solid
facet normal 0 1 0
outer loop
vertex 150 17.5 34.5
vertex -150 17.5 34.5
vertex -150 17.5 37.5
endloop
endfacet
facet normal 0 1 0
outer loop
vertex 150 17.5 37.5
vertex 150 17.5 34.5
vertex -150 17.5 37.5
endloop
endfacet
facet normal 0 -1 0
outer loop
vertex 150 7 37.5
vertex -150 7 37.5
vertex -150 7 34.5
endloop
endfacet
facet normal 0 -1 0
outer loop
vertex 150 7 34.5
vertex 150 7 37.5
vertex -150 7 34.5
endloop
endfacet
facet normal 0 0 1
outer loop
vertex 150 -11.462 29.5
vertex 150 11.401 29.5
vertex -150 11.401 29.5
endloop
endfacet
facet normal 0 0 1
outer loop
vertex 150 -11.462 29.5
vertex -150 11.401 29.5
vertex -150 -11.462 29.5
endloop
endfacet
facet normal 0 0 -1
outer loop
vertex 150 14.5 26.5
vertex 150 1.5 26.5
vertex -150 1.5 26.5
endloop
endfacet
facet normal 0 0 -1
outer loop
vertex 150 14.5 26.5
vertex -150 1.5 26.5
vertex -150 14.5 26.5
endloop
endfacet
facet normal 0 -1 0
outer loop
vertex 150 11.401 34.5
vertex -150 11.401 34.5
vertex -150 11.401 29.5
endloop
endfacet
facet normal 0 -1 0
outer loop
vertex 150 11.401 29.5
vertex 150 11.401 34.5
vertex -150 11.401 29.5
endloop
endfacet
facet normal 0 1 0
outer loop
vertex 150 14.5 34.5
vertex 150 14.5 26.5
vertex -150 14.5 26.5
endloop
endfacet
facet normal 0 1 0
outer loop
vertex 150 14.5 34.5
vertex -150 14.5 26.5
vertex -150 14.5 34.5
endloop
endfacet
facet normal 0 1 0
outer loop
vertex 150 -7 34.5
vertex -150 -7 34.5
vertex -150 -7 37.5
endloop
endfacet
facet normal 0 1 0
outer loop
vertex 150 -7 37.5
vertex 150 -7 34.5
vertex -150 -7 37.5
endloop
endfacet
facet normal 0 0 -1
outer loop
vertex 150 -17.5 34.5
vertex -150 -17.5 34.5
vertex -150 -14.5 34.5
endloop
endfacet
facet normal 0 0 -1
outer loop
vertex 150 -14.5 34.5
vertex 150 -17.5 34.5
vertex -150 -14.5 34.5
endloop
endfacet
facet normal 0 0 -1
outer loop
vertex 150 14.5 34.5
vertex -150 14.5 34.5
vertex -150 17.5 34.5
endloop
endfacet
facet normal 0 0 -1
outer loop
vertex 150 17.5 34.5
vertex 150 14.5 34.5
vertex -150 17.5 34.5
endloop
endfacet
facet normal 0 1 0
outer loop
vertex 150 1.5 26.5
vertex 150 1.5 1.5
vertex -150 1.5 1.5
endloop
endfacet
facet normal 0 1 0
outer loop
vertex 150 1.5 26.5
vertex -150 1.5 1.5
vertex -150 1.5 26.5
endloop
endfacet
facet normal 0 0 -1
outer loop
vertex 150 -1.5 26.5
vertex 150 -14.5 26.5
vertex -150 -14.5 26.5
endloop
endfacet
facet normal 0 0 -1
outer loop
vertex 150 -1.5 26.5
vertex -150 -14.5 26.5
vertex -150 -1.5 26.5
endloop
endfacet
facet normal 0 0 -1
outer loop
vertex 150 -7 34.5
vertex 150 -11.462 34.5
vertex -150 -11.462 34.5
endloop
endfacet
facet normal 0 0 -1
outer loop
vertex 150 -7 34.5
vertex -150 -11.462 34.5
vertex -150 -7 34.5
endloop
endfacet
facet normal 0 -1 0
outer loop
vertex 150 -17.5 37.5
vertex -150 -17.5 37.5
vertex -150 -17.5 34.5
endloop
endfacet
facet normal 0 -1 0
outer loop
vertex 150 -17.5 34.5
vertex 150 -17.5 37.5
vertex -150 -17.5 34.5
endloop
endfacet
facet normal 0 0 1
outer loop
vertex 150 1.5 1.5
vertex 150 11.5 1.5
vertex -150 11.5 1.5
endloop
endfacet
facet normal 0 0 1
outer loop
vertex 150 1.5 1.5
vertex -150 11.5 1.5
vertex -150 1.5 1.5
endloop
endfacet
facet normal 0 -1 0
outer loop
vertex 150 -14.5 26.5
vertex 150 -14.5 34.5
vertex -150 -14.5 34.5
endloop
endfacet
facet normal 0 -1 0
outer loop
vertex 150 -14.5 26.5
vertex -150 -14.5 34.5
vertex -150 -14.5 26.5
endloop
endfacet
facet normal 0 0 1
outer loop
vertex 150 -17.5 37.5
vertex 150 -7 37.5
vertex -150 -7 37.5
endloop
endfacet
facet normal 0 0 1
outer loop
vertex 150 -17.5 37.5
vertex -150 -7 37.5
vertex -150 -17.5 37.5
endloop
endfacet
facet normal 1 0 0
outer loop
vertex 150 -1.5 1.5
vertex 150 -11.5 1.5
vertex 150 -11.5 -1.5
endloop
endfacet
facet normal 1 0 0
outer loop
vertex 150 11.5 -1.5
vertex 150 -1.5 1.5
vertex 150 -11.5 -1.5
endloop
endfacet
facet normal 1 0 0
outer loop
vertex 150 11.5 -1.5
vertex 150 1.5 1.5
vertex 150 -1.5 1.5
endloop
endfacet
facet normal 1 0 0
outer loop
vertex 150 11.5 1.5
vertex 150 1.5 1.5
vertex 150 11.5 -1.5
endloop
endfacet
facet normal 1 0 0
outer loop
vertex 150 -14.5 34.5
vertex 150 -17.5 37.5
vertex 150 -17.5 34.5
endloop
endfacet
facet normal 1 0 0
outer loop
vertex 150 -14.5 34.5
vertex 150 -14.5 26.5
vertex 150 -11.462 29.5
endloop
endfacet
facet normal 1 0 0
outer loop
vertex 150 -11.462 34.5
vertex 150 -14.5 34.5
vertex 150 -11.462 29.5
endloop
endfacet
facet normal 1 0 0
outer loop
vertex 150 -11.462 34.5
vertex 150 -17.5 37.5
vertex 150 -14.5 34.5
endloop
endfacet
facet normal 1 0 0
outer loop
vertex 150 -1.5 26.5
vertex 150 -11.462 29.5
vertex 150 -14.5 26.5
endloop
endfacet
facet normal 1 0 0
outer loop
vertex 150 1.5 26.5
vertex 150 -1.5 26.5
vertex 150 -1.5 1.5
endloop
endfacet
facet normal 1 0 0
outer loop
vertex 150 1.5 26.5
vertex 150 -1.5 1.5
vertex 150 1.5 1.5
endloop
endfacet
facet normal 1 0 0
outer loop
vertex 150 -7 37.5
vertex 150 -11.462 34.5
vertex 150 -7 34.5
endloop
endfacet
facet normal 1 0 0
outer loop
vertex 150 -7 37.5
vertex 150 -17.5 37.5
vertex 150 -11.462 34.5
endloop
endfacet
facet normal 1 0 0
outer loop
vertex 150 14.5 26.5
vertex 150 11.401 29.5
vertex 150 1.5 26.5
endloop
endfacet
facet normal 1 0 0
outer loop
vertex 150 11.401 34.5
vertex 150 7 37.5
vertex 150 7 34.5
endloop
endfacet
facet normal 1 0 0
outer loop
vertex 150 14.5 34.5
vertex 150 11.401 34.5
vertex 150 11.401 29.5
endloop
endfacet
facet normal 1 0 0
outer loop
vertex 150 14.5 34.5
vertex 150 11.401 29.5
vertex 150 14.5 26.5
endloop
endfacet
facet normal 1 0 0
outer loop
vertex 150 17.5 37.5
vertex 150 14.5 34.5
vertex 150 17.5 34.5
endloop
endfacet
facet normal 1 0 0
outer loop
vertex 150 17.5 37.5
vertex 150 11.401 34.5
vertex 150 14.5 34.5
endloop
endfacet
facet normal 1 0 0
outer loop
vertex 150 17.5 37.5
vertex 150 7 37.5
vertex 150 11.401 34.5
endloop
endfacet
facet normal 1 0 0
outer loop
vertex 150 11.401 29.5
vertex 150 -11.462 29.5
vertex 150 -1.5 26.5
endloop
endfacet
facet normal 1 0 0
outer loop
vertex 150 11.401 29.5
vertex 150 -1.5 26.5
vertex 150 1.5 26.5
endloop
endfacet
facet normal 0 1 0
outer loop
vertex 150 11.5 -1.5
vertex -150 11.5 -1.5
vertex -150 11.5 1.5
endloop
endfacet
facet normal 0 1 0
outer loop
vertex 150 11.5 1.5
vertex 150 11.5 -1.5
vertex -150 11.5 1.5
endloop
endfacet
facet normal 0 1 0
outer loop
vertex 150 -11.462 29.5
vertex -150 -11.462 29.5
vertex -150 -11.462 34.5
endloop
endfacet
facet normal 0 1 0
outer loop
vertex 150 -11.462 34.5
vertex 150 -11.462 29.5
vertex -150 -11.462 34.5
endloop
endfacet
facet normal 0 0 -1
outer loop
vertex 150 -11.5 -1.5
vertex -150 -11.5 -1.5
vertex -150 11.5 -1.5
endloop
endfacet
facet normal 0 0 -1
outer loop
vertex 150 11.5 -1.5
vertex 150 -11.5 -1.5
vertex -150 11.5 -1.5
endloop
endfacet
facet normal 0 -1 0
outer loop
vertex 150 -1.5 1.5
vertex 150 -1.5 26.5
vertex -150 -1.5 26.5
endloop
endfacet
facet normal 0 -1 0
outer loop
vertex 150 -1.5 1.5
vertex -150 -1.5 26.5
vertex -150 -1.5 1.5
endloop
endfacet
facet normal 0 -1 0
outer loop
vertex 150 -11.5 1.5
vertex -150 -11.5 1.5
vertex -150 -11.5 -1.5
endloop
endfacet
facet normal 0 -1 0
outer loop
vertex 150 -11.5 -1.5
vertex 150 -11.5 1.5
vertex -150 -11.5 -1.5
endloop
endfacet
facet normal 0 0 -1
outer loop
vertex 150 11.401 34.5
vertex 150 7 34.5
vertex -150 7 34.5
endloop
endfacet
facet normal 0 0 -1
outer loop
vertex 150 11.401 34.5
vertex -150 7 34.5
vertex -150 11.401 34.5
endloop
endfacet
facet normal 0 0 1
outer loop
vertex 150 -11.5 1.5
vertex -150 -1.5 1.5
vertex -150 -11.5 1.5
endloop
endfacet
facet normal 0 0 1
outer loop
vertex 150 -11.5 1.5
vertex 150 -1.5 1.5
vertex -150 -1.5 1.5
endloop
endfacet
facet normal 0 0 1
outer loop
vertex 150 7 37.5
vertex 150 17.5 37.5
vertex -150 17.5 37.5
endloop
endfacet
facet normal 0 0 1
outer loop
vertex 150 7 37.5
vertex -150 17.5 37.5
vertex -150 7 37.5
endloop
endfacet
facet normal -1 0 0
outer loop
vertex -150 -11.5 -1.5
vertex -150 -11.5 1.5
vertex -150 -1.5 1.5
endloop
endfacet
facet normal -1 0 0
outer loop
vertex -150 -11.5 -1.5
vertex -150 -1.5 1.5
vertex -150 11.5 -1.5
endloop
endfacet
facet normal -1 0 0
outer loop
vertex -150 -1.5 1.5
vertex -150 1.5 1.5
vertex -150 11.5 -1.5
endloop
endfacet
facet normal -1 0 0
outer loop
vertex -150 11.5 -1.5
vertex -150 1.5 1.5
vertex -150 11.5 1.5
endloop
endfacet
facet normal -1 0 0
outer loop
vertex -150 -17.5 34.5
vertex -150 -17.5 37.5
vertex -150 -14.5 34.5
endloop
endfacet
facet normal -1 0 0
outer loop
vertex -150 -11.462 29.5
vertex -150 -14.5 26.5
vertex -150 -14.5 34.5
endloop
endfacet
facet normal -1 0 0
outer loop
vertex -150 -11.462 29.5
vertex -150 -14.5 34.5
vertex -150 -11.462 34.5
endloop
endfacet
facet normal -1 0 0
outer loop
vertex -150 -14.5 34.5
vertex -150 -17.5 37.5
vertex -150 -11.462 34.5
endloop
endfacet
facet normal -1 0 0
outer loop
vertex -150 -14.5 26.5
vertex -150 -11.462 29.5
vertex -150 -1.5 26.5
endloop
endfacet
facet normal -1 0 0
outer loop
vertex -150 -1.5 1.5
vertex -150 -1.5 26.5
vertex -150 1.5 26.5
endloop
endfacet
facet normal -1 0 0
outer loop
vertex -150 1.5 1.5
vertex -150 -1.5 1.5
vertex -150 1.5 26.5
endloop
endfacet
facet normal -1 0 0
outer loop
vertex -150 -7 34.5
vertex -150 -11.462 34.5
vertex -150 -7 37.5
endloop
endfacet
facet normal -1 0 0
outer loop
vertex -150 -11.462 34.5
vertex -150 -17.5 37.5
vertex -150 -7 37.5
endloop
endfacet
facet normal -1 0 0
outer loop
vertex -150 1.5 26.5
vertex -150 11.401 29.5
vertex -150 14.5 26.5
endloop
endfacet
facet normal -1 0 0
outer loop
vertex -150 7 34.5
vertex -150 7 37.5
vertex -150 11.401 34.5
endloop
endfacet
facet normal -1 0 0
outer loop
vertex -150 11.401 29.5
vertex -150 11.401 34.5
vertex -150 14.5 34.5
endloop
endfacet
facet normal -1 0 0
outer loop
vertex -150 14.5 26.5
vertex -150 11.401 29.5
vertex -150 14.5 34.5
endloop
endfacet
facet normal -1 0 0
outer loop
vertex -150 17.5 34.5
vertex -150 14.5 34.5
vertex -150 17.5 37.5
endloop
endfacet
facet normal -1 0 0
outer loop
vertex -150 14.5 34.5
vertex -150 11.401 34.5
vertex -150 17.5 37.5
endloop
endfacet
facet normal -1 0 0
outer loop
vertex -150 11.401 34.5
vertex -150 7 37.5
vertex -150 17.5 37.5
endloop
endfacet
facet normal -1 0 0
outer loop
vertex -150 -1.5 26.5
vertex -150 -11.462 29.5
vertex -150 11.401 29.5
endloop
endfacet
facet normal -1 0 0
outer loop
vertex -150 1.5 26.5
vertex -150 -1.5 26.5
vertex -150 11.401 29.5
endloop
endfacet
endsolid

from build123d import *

# Parameters (mm, degrees)
F1_DEPTH      = 150
F1_DEPTH_BACK = 150


with BuildPart() as f1:
    # F0 (on Right) → F1 (new body, two sides)
    with BuildSketch(Plane.YZ) as f1_sk:
        Polygon((-11.5, -1.5), (11.5, -1.5), (11.5, 1.5), (1.5, 1.5), (1.5, 26.5), (14.5, 26.5), (14.5, 29.5), (14.5, 34.5), (17.5, 34.5), (17.5, 37.5), (11.401065, 37.5), (7, 37.5), (7, 34.5), (11.401065, 34.5), (11.401065, 29.5), (-11.462442, 29.5), (-11.462442, 34.5), (-7, 34.5), (-7, 37.5), (-11.401065, 37.5), (-11.462442, 37.5), (-17.5, 37.5), (-17.5, 34.5), (-14.5, 34.5), (-14.5, 29.5), (-14.5, 26.5), (-1.5, 26.5), (-1.5, 1.5), (-11.5, 1.5), align=None)
    extrude(amount=F1_DEPTH)
    extrude(f1_sk.sketch, amount=-F1_DEPTH_BACK)


solid = f1.part
